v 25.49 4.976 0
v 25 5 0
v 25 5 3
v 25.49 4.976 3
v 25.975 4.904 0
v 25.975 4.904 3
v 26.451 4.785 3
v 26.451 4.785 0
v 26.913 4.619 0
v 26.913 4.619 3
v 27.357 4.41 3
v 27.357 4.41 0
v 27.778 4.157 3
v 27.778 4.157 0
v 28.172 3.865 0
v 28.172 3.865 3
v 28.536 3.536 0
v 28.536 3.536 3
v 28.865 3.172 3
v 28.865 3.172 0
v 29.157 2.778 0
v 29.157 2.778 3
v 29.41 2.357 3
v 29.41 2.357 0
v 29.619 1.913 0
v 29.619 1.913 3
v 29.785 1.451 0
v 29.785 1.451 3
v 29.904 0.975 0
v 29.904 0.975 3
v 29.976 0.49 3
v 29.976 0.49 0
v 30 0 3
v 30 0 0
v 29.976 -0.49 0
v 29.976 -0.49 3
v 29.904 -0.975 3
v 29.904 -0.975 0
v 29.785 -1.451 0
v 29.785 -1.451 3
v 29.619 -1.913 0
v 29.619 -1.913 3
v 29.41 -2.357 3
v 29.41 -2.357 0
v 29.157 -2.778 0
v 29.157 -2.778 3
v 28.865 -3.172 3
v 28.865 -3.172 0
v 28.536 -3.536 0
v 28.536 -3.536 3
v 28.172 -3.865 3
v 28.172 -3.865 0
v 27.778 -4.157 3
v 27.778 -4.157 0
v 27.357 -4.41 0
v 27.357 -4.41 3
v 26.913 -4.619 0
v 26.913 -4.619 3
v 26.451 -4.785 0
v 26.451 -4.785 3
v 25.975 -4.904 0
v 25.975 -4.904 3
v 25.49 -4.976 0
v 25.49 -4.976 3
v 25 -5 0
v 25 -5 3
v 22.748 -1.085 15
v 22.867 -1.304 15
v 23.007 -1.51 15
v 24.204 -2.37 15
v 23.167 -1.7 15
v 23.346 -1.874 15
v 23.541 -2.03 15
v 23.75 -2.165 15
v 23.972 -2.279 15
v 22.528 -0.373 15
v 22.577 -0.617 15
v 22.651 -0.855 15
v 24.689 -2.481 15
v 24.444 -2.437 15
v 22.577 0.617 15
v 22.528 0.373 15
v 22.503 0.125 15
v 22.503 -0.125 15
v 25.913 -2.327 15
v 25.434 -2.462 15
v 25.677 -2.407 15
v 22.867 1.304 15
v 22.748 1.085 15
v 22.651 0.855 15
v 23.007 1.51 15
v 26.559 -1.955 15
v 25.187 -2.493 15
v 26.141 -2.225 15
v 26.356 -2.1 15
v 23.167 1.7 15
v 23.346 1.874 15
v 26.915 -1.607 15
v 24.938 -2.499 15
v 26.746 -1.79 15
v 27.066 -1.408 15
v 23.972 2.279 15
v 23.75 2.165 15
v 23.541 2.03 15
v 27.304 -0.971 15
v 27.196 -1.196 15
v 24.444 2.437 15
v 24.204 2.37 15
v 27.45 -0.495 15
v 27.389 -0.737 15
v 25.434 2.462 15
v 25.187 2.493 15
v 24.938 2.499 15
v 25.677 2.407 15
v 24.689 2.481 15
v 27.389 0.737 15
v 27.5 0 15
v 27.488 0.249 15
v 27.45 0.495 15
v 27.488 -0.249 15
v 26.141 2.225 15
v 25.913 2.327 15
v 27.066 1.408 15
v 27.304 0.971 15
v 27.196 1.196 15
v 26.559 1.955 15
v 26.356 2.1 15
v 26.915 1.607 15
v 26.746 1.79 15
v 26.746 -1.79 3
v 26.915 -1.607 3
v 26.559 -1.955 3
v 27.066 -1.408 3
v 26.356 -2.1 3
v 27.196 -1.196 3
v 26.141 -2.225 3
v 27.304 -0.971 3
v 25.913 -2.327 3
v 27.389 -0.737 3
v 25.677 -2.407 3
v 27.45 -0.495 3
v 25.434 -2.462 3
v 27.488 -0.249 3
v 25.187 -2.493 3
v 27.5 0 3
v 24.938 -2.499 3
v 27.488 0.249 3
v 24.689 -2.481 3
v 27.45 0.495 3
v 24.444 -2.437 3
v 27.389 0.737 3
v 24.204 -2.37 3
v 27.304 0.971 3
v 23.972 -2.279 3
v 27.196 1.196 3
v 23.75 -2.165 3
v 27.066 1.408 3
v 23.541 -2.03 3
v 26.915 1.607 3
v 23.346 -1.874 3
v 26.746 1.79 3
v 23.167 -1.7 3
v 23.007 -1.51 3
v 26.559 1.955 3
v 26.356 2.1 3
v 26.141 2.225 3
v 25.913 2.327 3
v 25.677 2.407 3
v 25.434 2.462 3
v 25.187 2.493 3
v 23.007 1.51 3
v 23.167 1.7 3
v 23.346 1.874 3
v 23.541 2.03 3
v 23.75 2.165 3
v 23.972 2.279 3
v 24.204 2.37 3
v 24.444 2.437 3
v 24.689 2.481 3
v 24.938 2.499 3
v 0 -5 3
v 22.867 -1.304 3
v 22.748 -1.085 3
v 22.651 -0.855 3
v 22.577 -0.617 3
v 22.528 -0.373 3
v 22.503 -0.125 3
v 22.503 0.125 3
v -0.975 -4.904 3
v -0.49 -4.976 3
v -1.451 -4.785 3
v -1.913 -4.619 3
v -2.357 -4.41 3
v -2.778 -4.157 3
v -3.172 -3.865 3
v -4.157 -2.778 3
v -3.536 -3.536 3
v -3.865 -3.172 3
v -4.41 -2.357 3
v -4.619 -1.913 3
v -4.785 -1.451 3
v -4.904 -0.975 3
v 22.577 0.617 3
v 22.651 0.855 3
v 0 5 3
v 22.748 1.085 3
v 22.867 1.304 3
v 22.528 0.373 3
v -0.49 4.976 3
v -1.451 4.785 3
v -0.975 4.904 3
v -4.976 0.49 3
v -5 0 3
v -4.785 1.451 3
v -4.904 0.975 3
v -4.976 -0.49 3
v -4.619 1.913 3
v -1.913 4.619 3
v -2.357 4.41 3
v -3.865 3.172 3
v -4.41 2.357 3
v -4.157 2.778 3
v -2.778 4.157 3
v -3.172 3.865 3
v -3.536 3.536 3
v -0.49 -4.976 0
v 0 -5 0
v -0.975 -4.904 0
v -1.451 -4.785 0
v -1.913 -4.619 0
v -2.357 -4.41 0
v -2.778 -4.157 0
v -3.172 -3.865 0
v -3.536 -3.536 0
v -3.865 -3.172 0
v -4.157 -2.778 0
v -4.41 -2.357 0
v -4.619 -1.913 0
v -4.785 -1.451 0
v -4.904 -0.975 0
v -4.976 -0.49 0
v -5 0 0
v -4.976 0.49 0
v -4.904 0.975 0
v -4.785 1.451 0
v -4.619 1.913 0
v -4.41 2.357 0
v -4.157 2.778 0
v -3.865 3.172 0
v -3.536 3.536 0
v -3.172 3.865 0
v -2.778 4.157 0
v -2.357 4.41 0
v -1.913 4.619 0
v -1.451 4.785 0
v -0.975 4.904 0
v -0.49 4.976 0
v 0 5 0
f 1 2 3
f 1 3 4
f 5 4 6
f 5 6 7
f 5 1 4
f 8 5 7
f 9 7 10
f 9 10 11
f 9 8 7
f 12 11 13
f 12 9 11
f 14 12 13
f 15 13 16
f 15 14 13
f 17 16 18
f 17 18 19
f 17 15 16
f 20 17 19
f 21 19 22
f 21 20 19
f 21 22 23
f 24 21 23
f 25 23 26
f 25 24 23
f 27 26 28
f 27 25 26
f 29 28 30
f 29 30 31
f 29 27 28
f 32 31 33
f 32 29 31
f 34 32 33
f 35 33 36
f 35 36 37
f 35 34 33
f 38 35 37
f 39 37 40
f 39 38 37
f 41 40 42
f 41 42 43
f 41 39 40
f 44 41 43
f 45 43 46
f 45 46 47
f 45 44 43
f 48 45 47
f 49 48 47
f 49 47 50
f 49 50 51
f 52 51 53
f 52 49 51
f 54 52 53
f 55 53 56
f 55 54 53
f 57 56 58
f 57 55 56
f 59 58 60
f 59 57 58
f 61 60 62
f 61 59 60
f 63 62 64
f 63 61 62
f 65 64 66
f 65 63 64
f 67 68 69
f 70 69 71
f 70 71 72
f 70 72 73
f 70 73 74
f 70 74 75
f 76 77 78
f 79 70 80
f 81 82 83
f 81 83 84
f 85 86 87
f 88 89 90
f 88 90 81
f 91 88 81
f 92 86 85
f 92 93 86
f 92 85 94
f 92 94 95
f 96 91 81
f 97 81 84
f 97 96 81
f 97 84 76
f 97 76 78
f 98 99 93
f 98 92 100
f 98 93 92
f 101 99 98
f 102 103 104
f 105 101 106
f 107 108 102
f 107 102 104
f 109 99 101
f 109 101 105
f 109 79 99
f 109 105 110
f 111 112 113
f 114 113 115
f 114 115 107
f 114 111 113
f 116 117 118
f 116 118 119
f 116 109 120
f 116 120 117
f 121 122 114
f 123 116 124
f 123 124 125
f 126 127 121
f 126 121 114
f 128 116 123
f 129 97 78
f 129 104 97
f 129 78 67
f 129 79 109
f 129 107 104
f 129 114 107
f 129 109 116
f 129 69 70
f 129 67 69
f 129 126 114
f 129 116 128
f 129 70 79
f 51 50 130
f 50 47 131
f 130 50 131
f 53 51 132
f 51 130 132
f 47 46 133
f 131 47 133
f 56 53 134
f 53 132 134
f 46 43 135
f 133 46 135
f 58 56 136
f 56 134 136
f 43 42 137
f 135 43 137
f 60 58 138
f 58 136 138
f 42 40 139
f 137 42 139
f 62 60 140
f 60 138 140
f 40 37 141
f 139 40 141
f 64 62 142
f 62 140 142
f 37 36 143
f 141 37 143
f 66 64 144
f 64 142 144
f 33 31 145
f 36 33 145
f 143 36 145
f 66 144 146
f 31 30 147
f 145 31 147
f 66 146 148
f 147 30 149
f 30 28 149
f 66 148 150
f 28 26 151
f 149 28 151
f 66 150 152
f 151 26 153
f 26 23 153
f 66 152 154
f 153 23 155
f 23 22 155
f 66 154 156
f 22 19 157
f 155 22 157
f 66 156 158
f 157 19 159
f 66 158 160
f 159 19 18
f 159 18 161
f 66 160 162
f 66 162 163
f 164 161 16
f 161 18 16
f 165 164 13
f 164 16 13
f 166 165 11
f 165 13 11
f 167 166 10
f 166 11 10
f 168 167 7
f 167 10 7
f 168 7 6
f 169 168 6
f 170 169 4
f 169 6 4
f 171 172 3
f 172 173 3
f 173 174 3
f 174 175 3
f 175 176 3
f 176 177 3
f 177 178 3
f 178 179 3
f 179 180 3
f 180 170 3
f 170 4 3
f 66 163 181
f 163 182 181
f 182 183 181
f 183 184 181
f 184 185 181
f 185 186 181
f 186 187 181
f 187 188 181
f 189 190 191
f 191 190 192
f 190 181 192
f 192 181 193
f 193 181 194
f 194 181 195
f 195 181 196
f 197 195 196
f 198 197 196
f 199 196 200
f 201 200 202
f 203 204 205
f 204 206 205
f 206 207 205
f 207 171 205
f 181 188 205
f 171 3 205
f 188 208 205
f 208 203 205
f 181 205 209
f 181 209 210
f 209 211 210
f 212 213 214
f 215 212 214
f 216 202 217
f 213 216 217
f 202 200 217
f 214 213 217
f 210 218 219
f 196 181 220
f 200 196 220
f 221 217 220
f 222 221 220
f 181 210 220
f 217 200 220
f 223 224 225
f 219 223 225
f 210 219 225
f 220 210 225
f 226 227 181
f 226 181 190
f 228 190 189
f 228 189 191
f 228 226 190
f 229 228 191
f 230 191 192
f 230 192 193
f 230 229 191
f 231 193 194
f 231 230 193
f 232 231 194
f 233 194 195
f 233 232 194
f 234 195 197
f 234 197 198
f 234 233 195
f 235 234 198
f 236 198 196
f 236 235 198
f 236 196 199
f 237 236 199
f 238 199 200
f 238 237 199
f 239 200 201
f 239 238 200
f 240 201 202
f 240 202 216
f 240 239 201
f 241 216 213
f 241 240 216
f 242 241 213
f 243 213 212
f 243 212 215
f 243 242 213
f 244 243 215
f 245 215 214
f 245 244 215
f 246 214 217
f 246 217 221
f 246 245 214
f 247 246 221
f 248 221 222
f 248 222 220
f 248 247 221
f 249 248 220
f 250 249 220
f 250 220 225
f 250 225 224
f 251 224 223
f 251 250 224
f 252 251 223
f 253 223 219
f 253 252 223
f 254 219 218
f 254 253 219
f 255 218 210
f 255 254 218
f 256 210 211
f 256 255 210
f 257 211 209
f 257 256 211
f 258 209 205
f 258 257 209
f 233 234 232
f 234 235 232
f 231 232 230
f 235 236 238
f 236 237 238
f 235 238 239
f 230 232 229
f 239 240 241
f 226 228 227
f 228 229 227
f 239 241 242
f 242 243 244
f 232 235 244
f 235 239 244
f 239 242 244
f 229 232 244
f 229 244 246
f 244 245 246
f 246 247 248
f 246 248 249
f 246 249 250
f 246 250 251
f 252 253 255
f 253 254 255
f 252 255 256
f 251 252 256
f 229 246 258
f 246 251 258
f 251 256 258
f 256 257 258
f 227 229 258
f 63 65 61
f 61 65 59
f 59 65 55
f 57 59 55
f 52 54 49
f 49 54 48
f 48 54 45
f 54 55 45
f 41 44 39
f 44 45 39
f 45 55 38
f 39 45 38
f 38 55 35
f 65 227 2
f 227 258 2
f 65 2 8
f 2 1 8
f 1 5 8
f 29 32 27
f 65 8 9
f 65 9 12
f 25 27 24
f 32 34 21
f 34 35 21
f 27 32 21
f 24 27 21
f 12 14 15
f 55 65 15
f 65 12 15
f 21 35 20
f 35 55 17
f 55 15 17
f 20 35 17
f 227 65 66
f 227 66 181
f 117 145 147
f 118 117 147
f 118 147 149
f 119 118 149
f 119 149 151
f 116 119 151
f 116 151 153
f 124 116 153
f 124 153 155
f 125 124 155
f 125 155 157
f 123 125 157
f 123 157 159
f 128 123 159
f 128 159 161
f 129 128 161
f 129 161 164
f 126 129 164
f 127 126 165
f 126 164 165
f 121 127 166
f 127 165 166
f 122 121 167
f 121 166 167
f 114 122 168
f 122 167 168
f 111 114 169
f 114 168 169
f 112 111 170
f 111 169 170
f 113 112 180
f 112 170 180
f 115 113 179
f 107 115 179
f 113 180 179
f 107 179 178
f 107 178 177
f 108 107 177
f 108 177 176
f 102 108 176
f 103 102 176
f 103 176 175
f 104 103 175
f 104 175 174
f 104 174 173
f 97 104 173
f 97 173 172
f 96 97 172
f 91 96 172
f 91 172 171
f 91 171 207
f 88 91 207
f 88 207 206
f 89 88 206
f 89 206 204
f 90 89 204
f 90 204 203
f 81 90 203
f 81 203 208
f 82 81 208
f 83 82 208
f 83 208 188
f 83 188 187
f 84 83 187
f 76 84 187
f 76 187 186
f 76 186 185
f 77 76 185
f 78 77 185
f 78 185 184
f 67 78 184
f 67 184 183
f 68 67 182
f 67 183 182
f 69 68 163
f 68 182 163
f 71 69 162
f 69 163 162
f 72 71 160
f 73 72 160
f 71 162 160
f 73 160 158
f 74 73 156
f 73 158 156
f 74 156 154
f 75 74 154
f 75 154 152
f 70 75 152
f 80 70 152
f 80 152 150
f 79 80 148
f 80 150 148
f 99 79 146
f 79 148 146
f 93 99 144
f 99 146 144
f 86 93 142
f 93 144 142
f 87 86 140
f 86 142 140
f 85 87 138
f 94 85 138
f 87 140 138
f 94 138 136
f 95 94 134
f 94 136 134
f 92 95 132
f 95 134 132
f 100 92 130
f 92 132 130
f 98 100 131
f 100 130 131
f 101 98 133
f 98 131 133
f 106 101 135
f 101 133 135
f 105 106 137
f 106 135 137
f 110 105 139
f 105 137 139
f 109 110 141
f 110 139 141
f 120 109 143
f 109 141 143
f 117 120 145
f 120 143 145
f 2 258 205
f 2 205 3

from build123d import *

# Parameters (mm, degrees)
EXTRUDE_1_DEPTH = 3
SKETCH_1_4_R    = 2.5
EXTRUDE_3_DEPTH = 15


with BuildPart() as part:
    # 草圖1 → 填料-伸長1 (new body)
    with BuildSketch(Plane.XY):
        with BuildLine():
            Line((25, 5), (0, 5))
            ThreePointArc((0, 5), (-5, 0), (0, -5))
            Line((0, -5), (25, -5))
            ThreePointArc((25, -5), (30, 0), (25, 5))
        make_face()
    extrude(amount=EXTRUDE_1_DEPTH)

    # 草圖1<4> → 填料-伸長3 (add)
    with BuildSketch(Plane.XY):
        with Locations((25, 0)):
            Circle(SKETCH_1_4_R)
    extrude(amount=EXTRUDE_3_DEPTH)


solid = part.part
